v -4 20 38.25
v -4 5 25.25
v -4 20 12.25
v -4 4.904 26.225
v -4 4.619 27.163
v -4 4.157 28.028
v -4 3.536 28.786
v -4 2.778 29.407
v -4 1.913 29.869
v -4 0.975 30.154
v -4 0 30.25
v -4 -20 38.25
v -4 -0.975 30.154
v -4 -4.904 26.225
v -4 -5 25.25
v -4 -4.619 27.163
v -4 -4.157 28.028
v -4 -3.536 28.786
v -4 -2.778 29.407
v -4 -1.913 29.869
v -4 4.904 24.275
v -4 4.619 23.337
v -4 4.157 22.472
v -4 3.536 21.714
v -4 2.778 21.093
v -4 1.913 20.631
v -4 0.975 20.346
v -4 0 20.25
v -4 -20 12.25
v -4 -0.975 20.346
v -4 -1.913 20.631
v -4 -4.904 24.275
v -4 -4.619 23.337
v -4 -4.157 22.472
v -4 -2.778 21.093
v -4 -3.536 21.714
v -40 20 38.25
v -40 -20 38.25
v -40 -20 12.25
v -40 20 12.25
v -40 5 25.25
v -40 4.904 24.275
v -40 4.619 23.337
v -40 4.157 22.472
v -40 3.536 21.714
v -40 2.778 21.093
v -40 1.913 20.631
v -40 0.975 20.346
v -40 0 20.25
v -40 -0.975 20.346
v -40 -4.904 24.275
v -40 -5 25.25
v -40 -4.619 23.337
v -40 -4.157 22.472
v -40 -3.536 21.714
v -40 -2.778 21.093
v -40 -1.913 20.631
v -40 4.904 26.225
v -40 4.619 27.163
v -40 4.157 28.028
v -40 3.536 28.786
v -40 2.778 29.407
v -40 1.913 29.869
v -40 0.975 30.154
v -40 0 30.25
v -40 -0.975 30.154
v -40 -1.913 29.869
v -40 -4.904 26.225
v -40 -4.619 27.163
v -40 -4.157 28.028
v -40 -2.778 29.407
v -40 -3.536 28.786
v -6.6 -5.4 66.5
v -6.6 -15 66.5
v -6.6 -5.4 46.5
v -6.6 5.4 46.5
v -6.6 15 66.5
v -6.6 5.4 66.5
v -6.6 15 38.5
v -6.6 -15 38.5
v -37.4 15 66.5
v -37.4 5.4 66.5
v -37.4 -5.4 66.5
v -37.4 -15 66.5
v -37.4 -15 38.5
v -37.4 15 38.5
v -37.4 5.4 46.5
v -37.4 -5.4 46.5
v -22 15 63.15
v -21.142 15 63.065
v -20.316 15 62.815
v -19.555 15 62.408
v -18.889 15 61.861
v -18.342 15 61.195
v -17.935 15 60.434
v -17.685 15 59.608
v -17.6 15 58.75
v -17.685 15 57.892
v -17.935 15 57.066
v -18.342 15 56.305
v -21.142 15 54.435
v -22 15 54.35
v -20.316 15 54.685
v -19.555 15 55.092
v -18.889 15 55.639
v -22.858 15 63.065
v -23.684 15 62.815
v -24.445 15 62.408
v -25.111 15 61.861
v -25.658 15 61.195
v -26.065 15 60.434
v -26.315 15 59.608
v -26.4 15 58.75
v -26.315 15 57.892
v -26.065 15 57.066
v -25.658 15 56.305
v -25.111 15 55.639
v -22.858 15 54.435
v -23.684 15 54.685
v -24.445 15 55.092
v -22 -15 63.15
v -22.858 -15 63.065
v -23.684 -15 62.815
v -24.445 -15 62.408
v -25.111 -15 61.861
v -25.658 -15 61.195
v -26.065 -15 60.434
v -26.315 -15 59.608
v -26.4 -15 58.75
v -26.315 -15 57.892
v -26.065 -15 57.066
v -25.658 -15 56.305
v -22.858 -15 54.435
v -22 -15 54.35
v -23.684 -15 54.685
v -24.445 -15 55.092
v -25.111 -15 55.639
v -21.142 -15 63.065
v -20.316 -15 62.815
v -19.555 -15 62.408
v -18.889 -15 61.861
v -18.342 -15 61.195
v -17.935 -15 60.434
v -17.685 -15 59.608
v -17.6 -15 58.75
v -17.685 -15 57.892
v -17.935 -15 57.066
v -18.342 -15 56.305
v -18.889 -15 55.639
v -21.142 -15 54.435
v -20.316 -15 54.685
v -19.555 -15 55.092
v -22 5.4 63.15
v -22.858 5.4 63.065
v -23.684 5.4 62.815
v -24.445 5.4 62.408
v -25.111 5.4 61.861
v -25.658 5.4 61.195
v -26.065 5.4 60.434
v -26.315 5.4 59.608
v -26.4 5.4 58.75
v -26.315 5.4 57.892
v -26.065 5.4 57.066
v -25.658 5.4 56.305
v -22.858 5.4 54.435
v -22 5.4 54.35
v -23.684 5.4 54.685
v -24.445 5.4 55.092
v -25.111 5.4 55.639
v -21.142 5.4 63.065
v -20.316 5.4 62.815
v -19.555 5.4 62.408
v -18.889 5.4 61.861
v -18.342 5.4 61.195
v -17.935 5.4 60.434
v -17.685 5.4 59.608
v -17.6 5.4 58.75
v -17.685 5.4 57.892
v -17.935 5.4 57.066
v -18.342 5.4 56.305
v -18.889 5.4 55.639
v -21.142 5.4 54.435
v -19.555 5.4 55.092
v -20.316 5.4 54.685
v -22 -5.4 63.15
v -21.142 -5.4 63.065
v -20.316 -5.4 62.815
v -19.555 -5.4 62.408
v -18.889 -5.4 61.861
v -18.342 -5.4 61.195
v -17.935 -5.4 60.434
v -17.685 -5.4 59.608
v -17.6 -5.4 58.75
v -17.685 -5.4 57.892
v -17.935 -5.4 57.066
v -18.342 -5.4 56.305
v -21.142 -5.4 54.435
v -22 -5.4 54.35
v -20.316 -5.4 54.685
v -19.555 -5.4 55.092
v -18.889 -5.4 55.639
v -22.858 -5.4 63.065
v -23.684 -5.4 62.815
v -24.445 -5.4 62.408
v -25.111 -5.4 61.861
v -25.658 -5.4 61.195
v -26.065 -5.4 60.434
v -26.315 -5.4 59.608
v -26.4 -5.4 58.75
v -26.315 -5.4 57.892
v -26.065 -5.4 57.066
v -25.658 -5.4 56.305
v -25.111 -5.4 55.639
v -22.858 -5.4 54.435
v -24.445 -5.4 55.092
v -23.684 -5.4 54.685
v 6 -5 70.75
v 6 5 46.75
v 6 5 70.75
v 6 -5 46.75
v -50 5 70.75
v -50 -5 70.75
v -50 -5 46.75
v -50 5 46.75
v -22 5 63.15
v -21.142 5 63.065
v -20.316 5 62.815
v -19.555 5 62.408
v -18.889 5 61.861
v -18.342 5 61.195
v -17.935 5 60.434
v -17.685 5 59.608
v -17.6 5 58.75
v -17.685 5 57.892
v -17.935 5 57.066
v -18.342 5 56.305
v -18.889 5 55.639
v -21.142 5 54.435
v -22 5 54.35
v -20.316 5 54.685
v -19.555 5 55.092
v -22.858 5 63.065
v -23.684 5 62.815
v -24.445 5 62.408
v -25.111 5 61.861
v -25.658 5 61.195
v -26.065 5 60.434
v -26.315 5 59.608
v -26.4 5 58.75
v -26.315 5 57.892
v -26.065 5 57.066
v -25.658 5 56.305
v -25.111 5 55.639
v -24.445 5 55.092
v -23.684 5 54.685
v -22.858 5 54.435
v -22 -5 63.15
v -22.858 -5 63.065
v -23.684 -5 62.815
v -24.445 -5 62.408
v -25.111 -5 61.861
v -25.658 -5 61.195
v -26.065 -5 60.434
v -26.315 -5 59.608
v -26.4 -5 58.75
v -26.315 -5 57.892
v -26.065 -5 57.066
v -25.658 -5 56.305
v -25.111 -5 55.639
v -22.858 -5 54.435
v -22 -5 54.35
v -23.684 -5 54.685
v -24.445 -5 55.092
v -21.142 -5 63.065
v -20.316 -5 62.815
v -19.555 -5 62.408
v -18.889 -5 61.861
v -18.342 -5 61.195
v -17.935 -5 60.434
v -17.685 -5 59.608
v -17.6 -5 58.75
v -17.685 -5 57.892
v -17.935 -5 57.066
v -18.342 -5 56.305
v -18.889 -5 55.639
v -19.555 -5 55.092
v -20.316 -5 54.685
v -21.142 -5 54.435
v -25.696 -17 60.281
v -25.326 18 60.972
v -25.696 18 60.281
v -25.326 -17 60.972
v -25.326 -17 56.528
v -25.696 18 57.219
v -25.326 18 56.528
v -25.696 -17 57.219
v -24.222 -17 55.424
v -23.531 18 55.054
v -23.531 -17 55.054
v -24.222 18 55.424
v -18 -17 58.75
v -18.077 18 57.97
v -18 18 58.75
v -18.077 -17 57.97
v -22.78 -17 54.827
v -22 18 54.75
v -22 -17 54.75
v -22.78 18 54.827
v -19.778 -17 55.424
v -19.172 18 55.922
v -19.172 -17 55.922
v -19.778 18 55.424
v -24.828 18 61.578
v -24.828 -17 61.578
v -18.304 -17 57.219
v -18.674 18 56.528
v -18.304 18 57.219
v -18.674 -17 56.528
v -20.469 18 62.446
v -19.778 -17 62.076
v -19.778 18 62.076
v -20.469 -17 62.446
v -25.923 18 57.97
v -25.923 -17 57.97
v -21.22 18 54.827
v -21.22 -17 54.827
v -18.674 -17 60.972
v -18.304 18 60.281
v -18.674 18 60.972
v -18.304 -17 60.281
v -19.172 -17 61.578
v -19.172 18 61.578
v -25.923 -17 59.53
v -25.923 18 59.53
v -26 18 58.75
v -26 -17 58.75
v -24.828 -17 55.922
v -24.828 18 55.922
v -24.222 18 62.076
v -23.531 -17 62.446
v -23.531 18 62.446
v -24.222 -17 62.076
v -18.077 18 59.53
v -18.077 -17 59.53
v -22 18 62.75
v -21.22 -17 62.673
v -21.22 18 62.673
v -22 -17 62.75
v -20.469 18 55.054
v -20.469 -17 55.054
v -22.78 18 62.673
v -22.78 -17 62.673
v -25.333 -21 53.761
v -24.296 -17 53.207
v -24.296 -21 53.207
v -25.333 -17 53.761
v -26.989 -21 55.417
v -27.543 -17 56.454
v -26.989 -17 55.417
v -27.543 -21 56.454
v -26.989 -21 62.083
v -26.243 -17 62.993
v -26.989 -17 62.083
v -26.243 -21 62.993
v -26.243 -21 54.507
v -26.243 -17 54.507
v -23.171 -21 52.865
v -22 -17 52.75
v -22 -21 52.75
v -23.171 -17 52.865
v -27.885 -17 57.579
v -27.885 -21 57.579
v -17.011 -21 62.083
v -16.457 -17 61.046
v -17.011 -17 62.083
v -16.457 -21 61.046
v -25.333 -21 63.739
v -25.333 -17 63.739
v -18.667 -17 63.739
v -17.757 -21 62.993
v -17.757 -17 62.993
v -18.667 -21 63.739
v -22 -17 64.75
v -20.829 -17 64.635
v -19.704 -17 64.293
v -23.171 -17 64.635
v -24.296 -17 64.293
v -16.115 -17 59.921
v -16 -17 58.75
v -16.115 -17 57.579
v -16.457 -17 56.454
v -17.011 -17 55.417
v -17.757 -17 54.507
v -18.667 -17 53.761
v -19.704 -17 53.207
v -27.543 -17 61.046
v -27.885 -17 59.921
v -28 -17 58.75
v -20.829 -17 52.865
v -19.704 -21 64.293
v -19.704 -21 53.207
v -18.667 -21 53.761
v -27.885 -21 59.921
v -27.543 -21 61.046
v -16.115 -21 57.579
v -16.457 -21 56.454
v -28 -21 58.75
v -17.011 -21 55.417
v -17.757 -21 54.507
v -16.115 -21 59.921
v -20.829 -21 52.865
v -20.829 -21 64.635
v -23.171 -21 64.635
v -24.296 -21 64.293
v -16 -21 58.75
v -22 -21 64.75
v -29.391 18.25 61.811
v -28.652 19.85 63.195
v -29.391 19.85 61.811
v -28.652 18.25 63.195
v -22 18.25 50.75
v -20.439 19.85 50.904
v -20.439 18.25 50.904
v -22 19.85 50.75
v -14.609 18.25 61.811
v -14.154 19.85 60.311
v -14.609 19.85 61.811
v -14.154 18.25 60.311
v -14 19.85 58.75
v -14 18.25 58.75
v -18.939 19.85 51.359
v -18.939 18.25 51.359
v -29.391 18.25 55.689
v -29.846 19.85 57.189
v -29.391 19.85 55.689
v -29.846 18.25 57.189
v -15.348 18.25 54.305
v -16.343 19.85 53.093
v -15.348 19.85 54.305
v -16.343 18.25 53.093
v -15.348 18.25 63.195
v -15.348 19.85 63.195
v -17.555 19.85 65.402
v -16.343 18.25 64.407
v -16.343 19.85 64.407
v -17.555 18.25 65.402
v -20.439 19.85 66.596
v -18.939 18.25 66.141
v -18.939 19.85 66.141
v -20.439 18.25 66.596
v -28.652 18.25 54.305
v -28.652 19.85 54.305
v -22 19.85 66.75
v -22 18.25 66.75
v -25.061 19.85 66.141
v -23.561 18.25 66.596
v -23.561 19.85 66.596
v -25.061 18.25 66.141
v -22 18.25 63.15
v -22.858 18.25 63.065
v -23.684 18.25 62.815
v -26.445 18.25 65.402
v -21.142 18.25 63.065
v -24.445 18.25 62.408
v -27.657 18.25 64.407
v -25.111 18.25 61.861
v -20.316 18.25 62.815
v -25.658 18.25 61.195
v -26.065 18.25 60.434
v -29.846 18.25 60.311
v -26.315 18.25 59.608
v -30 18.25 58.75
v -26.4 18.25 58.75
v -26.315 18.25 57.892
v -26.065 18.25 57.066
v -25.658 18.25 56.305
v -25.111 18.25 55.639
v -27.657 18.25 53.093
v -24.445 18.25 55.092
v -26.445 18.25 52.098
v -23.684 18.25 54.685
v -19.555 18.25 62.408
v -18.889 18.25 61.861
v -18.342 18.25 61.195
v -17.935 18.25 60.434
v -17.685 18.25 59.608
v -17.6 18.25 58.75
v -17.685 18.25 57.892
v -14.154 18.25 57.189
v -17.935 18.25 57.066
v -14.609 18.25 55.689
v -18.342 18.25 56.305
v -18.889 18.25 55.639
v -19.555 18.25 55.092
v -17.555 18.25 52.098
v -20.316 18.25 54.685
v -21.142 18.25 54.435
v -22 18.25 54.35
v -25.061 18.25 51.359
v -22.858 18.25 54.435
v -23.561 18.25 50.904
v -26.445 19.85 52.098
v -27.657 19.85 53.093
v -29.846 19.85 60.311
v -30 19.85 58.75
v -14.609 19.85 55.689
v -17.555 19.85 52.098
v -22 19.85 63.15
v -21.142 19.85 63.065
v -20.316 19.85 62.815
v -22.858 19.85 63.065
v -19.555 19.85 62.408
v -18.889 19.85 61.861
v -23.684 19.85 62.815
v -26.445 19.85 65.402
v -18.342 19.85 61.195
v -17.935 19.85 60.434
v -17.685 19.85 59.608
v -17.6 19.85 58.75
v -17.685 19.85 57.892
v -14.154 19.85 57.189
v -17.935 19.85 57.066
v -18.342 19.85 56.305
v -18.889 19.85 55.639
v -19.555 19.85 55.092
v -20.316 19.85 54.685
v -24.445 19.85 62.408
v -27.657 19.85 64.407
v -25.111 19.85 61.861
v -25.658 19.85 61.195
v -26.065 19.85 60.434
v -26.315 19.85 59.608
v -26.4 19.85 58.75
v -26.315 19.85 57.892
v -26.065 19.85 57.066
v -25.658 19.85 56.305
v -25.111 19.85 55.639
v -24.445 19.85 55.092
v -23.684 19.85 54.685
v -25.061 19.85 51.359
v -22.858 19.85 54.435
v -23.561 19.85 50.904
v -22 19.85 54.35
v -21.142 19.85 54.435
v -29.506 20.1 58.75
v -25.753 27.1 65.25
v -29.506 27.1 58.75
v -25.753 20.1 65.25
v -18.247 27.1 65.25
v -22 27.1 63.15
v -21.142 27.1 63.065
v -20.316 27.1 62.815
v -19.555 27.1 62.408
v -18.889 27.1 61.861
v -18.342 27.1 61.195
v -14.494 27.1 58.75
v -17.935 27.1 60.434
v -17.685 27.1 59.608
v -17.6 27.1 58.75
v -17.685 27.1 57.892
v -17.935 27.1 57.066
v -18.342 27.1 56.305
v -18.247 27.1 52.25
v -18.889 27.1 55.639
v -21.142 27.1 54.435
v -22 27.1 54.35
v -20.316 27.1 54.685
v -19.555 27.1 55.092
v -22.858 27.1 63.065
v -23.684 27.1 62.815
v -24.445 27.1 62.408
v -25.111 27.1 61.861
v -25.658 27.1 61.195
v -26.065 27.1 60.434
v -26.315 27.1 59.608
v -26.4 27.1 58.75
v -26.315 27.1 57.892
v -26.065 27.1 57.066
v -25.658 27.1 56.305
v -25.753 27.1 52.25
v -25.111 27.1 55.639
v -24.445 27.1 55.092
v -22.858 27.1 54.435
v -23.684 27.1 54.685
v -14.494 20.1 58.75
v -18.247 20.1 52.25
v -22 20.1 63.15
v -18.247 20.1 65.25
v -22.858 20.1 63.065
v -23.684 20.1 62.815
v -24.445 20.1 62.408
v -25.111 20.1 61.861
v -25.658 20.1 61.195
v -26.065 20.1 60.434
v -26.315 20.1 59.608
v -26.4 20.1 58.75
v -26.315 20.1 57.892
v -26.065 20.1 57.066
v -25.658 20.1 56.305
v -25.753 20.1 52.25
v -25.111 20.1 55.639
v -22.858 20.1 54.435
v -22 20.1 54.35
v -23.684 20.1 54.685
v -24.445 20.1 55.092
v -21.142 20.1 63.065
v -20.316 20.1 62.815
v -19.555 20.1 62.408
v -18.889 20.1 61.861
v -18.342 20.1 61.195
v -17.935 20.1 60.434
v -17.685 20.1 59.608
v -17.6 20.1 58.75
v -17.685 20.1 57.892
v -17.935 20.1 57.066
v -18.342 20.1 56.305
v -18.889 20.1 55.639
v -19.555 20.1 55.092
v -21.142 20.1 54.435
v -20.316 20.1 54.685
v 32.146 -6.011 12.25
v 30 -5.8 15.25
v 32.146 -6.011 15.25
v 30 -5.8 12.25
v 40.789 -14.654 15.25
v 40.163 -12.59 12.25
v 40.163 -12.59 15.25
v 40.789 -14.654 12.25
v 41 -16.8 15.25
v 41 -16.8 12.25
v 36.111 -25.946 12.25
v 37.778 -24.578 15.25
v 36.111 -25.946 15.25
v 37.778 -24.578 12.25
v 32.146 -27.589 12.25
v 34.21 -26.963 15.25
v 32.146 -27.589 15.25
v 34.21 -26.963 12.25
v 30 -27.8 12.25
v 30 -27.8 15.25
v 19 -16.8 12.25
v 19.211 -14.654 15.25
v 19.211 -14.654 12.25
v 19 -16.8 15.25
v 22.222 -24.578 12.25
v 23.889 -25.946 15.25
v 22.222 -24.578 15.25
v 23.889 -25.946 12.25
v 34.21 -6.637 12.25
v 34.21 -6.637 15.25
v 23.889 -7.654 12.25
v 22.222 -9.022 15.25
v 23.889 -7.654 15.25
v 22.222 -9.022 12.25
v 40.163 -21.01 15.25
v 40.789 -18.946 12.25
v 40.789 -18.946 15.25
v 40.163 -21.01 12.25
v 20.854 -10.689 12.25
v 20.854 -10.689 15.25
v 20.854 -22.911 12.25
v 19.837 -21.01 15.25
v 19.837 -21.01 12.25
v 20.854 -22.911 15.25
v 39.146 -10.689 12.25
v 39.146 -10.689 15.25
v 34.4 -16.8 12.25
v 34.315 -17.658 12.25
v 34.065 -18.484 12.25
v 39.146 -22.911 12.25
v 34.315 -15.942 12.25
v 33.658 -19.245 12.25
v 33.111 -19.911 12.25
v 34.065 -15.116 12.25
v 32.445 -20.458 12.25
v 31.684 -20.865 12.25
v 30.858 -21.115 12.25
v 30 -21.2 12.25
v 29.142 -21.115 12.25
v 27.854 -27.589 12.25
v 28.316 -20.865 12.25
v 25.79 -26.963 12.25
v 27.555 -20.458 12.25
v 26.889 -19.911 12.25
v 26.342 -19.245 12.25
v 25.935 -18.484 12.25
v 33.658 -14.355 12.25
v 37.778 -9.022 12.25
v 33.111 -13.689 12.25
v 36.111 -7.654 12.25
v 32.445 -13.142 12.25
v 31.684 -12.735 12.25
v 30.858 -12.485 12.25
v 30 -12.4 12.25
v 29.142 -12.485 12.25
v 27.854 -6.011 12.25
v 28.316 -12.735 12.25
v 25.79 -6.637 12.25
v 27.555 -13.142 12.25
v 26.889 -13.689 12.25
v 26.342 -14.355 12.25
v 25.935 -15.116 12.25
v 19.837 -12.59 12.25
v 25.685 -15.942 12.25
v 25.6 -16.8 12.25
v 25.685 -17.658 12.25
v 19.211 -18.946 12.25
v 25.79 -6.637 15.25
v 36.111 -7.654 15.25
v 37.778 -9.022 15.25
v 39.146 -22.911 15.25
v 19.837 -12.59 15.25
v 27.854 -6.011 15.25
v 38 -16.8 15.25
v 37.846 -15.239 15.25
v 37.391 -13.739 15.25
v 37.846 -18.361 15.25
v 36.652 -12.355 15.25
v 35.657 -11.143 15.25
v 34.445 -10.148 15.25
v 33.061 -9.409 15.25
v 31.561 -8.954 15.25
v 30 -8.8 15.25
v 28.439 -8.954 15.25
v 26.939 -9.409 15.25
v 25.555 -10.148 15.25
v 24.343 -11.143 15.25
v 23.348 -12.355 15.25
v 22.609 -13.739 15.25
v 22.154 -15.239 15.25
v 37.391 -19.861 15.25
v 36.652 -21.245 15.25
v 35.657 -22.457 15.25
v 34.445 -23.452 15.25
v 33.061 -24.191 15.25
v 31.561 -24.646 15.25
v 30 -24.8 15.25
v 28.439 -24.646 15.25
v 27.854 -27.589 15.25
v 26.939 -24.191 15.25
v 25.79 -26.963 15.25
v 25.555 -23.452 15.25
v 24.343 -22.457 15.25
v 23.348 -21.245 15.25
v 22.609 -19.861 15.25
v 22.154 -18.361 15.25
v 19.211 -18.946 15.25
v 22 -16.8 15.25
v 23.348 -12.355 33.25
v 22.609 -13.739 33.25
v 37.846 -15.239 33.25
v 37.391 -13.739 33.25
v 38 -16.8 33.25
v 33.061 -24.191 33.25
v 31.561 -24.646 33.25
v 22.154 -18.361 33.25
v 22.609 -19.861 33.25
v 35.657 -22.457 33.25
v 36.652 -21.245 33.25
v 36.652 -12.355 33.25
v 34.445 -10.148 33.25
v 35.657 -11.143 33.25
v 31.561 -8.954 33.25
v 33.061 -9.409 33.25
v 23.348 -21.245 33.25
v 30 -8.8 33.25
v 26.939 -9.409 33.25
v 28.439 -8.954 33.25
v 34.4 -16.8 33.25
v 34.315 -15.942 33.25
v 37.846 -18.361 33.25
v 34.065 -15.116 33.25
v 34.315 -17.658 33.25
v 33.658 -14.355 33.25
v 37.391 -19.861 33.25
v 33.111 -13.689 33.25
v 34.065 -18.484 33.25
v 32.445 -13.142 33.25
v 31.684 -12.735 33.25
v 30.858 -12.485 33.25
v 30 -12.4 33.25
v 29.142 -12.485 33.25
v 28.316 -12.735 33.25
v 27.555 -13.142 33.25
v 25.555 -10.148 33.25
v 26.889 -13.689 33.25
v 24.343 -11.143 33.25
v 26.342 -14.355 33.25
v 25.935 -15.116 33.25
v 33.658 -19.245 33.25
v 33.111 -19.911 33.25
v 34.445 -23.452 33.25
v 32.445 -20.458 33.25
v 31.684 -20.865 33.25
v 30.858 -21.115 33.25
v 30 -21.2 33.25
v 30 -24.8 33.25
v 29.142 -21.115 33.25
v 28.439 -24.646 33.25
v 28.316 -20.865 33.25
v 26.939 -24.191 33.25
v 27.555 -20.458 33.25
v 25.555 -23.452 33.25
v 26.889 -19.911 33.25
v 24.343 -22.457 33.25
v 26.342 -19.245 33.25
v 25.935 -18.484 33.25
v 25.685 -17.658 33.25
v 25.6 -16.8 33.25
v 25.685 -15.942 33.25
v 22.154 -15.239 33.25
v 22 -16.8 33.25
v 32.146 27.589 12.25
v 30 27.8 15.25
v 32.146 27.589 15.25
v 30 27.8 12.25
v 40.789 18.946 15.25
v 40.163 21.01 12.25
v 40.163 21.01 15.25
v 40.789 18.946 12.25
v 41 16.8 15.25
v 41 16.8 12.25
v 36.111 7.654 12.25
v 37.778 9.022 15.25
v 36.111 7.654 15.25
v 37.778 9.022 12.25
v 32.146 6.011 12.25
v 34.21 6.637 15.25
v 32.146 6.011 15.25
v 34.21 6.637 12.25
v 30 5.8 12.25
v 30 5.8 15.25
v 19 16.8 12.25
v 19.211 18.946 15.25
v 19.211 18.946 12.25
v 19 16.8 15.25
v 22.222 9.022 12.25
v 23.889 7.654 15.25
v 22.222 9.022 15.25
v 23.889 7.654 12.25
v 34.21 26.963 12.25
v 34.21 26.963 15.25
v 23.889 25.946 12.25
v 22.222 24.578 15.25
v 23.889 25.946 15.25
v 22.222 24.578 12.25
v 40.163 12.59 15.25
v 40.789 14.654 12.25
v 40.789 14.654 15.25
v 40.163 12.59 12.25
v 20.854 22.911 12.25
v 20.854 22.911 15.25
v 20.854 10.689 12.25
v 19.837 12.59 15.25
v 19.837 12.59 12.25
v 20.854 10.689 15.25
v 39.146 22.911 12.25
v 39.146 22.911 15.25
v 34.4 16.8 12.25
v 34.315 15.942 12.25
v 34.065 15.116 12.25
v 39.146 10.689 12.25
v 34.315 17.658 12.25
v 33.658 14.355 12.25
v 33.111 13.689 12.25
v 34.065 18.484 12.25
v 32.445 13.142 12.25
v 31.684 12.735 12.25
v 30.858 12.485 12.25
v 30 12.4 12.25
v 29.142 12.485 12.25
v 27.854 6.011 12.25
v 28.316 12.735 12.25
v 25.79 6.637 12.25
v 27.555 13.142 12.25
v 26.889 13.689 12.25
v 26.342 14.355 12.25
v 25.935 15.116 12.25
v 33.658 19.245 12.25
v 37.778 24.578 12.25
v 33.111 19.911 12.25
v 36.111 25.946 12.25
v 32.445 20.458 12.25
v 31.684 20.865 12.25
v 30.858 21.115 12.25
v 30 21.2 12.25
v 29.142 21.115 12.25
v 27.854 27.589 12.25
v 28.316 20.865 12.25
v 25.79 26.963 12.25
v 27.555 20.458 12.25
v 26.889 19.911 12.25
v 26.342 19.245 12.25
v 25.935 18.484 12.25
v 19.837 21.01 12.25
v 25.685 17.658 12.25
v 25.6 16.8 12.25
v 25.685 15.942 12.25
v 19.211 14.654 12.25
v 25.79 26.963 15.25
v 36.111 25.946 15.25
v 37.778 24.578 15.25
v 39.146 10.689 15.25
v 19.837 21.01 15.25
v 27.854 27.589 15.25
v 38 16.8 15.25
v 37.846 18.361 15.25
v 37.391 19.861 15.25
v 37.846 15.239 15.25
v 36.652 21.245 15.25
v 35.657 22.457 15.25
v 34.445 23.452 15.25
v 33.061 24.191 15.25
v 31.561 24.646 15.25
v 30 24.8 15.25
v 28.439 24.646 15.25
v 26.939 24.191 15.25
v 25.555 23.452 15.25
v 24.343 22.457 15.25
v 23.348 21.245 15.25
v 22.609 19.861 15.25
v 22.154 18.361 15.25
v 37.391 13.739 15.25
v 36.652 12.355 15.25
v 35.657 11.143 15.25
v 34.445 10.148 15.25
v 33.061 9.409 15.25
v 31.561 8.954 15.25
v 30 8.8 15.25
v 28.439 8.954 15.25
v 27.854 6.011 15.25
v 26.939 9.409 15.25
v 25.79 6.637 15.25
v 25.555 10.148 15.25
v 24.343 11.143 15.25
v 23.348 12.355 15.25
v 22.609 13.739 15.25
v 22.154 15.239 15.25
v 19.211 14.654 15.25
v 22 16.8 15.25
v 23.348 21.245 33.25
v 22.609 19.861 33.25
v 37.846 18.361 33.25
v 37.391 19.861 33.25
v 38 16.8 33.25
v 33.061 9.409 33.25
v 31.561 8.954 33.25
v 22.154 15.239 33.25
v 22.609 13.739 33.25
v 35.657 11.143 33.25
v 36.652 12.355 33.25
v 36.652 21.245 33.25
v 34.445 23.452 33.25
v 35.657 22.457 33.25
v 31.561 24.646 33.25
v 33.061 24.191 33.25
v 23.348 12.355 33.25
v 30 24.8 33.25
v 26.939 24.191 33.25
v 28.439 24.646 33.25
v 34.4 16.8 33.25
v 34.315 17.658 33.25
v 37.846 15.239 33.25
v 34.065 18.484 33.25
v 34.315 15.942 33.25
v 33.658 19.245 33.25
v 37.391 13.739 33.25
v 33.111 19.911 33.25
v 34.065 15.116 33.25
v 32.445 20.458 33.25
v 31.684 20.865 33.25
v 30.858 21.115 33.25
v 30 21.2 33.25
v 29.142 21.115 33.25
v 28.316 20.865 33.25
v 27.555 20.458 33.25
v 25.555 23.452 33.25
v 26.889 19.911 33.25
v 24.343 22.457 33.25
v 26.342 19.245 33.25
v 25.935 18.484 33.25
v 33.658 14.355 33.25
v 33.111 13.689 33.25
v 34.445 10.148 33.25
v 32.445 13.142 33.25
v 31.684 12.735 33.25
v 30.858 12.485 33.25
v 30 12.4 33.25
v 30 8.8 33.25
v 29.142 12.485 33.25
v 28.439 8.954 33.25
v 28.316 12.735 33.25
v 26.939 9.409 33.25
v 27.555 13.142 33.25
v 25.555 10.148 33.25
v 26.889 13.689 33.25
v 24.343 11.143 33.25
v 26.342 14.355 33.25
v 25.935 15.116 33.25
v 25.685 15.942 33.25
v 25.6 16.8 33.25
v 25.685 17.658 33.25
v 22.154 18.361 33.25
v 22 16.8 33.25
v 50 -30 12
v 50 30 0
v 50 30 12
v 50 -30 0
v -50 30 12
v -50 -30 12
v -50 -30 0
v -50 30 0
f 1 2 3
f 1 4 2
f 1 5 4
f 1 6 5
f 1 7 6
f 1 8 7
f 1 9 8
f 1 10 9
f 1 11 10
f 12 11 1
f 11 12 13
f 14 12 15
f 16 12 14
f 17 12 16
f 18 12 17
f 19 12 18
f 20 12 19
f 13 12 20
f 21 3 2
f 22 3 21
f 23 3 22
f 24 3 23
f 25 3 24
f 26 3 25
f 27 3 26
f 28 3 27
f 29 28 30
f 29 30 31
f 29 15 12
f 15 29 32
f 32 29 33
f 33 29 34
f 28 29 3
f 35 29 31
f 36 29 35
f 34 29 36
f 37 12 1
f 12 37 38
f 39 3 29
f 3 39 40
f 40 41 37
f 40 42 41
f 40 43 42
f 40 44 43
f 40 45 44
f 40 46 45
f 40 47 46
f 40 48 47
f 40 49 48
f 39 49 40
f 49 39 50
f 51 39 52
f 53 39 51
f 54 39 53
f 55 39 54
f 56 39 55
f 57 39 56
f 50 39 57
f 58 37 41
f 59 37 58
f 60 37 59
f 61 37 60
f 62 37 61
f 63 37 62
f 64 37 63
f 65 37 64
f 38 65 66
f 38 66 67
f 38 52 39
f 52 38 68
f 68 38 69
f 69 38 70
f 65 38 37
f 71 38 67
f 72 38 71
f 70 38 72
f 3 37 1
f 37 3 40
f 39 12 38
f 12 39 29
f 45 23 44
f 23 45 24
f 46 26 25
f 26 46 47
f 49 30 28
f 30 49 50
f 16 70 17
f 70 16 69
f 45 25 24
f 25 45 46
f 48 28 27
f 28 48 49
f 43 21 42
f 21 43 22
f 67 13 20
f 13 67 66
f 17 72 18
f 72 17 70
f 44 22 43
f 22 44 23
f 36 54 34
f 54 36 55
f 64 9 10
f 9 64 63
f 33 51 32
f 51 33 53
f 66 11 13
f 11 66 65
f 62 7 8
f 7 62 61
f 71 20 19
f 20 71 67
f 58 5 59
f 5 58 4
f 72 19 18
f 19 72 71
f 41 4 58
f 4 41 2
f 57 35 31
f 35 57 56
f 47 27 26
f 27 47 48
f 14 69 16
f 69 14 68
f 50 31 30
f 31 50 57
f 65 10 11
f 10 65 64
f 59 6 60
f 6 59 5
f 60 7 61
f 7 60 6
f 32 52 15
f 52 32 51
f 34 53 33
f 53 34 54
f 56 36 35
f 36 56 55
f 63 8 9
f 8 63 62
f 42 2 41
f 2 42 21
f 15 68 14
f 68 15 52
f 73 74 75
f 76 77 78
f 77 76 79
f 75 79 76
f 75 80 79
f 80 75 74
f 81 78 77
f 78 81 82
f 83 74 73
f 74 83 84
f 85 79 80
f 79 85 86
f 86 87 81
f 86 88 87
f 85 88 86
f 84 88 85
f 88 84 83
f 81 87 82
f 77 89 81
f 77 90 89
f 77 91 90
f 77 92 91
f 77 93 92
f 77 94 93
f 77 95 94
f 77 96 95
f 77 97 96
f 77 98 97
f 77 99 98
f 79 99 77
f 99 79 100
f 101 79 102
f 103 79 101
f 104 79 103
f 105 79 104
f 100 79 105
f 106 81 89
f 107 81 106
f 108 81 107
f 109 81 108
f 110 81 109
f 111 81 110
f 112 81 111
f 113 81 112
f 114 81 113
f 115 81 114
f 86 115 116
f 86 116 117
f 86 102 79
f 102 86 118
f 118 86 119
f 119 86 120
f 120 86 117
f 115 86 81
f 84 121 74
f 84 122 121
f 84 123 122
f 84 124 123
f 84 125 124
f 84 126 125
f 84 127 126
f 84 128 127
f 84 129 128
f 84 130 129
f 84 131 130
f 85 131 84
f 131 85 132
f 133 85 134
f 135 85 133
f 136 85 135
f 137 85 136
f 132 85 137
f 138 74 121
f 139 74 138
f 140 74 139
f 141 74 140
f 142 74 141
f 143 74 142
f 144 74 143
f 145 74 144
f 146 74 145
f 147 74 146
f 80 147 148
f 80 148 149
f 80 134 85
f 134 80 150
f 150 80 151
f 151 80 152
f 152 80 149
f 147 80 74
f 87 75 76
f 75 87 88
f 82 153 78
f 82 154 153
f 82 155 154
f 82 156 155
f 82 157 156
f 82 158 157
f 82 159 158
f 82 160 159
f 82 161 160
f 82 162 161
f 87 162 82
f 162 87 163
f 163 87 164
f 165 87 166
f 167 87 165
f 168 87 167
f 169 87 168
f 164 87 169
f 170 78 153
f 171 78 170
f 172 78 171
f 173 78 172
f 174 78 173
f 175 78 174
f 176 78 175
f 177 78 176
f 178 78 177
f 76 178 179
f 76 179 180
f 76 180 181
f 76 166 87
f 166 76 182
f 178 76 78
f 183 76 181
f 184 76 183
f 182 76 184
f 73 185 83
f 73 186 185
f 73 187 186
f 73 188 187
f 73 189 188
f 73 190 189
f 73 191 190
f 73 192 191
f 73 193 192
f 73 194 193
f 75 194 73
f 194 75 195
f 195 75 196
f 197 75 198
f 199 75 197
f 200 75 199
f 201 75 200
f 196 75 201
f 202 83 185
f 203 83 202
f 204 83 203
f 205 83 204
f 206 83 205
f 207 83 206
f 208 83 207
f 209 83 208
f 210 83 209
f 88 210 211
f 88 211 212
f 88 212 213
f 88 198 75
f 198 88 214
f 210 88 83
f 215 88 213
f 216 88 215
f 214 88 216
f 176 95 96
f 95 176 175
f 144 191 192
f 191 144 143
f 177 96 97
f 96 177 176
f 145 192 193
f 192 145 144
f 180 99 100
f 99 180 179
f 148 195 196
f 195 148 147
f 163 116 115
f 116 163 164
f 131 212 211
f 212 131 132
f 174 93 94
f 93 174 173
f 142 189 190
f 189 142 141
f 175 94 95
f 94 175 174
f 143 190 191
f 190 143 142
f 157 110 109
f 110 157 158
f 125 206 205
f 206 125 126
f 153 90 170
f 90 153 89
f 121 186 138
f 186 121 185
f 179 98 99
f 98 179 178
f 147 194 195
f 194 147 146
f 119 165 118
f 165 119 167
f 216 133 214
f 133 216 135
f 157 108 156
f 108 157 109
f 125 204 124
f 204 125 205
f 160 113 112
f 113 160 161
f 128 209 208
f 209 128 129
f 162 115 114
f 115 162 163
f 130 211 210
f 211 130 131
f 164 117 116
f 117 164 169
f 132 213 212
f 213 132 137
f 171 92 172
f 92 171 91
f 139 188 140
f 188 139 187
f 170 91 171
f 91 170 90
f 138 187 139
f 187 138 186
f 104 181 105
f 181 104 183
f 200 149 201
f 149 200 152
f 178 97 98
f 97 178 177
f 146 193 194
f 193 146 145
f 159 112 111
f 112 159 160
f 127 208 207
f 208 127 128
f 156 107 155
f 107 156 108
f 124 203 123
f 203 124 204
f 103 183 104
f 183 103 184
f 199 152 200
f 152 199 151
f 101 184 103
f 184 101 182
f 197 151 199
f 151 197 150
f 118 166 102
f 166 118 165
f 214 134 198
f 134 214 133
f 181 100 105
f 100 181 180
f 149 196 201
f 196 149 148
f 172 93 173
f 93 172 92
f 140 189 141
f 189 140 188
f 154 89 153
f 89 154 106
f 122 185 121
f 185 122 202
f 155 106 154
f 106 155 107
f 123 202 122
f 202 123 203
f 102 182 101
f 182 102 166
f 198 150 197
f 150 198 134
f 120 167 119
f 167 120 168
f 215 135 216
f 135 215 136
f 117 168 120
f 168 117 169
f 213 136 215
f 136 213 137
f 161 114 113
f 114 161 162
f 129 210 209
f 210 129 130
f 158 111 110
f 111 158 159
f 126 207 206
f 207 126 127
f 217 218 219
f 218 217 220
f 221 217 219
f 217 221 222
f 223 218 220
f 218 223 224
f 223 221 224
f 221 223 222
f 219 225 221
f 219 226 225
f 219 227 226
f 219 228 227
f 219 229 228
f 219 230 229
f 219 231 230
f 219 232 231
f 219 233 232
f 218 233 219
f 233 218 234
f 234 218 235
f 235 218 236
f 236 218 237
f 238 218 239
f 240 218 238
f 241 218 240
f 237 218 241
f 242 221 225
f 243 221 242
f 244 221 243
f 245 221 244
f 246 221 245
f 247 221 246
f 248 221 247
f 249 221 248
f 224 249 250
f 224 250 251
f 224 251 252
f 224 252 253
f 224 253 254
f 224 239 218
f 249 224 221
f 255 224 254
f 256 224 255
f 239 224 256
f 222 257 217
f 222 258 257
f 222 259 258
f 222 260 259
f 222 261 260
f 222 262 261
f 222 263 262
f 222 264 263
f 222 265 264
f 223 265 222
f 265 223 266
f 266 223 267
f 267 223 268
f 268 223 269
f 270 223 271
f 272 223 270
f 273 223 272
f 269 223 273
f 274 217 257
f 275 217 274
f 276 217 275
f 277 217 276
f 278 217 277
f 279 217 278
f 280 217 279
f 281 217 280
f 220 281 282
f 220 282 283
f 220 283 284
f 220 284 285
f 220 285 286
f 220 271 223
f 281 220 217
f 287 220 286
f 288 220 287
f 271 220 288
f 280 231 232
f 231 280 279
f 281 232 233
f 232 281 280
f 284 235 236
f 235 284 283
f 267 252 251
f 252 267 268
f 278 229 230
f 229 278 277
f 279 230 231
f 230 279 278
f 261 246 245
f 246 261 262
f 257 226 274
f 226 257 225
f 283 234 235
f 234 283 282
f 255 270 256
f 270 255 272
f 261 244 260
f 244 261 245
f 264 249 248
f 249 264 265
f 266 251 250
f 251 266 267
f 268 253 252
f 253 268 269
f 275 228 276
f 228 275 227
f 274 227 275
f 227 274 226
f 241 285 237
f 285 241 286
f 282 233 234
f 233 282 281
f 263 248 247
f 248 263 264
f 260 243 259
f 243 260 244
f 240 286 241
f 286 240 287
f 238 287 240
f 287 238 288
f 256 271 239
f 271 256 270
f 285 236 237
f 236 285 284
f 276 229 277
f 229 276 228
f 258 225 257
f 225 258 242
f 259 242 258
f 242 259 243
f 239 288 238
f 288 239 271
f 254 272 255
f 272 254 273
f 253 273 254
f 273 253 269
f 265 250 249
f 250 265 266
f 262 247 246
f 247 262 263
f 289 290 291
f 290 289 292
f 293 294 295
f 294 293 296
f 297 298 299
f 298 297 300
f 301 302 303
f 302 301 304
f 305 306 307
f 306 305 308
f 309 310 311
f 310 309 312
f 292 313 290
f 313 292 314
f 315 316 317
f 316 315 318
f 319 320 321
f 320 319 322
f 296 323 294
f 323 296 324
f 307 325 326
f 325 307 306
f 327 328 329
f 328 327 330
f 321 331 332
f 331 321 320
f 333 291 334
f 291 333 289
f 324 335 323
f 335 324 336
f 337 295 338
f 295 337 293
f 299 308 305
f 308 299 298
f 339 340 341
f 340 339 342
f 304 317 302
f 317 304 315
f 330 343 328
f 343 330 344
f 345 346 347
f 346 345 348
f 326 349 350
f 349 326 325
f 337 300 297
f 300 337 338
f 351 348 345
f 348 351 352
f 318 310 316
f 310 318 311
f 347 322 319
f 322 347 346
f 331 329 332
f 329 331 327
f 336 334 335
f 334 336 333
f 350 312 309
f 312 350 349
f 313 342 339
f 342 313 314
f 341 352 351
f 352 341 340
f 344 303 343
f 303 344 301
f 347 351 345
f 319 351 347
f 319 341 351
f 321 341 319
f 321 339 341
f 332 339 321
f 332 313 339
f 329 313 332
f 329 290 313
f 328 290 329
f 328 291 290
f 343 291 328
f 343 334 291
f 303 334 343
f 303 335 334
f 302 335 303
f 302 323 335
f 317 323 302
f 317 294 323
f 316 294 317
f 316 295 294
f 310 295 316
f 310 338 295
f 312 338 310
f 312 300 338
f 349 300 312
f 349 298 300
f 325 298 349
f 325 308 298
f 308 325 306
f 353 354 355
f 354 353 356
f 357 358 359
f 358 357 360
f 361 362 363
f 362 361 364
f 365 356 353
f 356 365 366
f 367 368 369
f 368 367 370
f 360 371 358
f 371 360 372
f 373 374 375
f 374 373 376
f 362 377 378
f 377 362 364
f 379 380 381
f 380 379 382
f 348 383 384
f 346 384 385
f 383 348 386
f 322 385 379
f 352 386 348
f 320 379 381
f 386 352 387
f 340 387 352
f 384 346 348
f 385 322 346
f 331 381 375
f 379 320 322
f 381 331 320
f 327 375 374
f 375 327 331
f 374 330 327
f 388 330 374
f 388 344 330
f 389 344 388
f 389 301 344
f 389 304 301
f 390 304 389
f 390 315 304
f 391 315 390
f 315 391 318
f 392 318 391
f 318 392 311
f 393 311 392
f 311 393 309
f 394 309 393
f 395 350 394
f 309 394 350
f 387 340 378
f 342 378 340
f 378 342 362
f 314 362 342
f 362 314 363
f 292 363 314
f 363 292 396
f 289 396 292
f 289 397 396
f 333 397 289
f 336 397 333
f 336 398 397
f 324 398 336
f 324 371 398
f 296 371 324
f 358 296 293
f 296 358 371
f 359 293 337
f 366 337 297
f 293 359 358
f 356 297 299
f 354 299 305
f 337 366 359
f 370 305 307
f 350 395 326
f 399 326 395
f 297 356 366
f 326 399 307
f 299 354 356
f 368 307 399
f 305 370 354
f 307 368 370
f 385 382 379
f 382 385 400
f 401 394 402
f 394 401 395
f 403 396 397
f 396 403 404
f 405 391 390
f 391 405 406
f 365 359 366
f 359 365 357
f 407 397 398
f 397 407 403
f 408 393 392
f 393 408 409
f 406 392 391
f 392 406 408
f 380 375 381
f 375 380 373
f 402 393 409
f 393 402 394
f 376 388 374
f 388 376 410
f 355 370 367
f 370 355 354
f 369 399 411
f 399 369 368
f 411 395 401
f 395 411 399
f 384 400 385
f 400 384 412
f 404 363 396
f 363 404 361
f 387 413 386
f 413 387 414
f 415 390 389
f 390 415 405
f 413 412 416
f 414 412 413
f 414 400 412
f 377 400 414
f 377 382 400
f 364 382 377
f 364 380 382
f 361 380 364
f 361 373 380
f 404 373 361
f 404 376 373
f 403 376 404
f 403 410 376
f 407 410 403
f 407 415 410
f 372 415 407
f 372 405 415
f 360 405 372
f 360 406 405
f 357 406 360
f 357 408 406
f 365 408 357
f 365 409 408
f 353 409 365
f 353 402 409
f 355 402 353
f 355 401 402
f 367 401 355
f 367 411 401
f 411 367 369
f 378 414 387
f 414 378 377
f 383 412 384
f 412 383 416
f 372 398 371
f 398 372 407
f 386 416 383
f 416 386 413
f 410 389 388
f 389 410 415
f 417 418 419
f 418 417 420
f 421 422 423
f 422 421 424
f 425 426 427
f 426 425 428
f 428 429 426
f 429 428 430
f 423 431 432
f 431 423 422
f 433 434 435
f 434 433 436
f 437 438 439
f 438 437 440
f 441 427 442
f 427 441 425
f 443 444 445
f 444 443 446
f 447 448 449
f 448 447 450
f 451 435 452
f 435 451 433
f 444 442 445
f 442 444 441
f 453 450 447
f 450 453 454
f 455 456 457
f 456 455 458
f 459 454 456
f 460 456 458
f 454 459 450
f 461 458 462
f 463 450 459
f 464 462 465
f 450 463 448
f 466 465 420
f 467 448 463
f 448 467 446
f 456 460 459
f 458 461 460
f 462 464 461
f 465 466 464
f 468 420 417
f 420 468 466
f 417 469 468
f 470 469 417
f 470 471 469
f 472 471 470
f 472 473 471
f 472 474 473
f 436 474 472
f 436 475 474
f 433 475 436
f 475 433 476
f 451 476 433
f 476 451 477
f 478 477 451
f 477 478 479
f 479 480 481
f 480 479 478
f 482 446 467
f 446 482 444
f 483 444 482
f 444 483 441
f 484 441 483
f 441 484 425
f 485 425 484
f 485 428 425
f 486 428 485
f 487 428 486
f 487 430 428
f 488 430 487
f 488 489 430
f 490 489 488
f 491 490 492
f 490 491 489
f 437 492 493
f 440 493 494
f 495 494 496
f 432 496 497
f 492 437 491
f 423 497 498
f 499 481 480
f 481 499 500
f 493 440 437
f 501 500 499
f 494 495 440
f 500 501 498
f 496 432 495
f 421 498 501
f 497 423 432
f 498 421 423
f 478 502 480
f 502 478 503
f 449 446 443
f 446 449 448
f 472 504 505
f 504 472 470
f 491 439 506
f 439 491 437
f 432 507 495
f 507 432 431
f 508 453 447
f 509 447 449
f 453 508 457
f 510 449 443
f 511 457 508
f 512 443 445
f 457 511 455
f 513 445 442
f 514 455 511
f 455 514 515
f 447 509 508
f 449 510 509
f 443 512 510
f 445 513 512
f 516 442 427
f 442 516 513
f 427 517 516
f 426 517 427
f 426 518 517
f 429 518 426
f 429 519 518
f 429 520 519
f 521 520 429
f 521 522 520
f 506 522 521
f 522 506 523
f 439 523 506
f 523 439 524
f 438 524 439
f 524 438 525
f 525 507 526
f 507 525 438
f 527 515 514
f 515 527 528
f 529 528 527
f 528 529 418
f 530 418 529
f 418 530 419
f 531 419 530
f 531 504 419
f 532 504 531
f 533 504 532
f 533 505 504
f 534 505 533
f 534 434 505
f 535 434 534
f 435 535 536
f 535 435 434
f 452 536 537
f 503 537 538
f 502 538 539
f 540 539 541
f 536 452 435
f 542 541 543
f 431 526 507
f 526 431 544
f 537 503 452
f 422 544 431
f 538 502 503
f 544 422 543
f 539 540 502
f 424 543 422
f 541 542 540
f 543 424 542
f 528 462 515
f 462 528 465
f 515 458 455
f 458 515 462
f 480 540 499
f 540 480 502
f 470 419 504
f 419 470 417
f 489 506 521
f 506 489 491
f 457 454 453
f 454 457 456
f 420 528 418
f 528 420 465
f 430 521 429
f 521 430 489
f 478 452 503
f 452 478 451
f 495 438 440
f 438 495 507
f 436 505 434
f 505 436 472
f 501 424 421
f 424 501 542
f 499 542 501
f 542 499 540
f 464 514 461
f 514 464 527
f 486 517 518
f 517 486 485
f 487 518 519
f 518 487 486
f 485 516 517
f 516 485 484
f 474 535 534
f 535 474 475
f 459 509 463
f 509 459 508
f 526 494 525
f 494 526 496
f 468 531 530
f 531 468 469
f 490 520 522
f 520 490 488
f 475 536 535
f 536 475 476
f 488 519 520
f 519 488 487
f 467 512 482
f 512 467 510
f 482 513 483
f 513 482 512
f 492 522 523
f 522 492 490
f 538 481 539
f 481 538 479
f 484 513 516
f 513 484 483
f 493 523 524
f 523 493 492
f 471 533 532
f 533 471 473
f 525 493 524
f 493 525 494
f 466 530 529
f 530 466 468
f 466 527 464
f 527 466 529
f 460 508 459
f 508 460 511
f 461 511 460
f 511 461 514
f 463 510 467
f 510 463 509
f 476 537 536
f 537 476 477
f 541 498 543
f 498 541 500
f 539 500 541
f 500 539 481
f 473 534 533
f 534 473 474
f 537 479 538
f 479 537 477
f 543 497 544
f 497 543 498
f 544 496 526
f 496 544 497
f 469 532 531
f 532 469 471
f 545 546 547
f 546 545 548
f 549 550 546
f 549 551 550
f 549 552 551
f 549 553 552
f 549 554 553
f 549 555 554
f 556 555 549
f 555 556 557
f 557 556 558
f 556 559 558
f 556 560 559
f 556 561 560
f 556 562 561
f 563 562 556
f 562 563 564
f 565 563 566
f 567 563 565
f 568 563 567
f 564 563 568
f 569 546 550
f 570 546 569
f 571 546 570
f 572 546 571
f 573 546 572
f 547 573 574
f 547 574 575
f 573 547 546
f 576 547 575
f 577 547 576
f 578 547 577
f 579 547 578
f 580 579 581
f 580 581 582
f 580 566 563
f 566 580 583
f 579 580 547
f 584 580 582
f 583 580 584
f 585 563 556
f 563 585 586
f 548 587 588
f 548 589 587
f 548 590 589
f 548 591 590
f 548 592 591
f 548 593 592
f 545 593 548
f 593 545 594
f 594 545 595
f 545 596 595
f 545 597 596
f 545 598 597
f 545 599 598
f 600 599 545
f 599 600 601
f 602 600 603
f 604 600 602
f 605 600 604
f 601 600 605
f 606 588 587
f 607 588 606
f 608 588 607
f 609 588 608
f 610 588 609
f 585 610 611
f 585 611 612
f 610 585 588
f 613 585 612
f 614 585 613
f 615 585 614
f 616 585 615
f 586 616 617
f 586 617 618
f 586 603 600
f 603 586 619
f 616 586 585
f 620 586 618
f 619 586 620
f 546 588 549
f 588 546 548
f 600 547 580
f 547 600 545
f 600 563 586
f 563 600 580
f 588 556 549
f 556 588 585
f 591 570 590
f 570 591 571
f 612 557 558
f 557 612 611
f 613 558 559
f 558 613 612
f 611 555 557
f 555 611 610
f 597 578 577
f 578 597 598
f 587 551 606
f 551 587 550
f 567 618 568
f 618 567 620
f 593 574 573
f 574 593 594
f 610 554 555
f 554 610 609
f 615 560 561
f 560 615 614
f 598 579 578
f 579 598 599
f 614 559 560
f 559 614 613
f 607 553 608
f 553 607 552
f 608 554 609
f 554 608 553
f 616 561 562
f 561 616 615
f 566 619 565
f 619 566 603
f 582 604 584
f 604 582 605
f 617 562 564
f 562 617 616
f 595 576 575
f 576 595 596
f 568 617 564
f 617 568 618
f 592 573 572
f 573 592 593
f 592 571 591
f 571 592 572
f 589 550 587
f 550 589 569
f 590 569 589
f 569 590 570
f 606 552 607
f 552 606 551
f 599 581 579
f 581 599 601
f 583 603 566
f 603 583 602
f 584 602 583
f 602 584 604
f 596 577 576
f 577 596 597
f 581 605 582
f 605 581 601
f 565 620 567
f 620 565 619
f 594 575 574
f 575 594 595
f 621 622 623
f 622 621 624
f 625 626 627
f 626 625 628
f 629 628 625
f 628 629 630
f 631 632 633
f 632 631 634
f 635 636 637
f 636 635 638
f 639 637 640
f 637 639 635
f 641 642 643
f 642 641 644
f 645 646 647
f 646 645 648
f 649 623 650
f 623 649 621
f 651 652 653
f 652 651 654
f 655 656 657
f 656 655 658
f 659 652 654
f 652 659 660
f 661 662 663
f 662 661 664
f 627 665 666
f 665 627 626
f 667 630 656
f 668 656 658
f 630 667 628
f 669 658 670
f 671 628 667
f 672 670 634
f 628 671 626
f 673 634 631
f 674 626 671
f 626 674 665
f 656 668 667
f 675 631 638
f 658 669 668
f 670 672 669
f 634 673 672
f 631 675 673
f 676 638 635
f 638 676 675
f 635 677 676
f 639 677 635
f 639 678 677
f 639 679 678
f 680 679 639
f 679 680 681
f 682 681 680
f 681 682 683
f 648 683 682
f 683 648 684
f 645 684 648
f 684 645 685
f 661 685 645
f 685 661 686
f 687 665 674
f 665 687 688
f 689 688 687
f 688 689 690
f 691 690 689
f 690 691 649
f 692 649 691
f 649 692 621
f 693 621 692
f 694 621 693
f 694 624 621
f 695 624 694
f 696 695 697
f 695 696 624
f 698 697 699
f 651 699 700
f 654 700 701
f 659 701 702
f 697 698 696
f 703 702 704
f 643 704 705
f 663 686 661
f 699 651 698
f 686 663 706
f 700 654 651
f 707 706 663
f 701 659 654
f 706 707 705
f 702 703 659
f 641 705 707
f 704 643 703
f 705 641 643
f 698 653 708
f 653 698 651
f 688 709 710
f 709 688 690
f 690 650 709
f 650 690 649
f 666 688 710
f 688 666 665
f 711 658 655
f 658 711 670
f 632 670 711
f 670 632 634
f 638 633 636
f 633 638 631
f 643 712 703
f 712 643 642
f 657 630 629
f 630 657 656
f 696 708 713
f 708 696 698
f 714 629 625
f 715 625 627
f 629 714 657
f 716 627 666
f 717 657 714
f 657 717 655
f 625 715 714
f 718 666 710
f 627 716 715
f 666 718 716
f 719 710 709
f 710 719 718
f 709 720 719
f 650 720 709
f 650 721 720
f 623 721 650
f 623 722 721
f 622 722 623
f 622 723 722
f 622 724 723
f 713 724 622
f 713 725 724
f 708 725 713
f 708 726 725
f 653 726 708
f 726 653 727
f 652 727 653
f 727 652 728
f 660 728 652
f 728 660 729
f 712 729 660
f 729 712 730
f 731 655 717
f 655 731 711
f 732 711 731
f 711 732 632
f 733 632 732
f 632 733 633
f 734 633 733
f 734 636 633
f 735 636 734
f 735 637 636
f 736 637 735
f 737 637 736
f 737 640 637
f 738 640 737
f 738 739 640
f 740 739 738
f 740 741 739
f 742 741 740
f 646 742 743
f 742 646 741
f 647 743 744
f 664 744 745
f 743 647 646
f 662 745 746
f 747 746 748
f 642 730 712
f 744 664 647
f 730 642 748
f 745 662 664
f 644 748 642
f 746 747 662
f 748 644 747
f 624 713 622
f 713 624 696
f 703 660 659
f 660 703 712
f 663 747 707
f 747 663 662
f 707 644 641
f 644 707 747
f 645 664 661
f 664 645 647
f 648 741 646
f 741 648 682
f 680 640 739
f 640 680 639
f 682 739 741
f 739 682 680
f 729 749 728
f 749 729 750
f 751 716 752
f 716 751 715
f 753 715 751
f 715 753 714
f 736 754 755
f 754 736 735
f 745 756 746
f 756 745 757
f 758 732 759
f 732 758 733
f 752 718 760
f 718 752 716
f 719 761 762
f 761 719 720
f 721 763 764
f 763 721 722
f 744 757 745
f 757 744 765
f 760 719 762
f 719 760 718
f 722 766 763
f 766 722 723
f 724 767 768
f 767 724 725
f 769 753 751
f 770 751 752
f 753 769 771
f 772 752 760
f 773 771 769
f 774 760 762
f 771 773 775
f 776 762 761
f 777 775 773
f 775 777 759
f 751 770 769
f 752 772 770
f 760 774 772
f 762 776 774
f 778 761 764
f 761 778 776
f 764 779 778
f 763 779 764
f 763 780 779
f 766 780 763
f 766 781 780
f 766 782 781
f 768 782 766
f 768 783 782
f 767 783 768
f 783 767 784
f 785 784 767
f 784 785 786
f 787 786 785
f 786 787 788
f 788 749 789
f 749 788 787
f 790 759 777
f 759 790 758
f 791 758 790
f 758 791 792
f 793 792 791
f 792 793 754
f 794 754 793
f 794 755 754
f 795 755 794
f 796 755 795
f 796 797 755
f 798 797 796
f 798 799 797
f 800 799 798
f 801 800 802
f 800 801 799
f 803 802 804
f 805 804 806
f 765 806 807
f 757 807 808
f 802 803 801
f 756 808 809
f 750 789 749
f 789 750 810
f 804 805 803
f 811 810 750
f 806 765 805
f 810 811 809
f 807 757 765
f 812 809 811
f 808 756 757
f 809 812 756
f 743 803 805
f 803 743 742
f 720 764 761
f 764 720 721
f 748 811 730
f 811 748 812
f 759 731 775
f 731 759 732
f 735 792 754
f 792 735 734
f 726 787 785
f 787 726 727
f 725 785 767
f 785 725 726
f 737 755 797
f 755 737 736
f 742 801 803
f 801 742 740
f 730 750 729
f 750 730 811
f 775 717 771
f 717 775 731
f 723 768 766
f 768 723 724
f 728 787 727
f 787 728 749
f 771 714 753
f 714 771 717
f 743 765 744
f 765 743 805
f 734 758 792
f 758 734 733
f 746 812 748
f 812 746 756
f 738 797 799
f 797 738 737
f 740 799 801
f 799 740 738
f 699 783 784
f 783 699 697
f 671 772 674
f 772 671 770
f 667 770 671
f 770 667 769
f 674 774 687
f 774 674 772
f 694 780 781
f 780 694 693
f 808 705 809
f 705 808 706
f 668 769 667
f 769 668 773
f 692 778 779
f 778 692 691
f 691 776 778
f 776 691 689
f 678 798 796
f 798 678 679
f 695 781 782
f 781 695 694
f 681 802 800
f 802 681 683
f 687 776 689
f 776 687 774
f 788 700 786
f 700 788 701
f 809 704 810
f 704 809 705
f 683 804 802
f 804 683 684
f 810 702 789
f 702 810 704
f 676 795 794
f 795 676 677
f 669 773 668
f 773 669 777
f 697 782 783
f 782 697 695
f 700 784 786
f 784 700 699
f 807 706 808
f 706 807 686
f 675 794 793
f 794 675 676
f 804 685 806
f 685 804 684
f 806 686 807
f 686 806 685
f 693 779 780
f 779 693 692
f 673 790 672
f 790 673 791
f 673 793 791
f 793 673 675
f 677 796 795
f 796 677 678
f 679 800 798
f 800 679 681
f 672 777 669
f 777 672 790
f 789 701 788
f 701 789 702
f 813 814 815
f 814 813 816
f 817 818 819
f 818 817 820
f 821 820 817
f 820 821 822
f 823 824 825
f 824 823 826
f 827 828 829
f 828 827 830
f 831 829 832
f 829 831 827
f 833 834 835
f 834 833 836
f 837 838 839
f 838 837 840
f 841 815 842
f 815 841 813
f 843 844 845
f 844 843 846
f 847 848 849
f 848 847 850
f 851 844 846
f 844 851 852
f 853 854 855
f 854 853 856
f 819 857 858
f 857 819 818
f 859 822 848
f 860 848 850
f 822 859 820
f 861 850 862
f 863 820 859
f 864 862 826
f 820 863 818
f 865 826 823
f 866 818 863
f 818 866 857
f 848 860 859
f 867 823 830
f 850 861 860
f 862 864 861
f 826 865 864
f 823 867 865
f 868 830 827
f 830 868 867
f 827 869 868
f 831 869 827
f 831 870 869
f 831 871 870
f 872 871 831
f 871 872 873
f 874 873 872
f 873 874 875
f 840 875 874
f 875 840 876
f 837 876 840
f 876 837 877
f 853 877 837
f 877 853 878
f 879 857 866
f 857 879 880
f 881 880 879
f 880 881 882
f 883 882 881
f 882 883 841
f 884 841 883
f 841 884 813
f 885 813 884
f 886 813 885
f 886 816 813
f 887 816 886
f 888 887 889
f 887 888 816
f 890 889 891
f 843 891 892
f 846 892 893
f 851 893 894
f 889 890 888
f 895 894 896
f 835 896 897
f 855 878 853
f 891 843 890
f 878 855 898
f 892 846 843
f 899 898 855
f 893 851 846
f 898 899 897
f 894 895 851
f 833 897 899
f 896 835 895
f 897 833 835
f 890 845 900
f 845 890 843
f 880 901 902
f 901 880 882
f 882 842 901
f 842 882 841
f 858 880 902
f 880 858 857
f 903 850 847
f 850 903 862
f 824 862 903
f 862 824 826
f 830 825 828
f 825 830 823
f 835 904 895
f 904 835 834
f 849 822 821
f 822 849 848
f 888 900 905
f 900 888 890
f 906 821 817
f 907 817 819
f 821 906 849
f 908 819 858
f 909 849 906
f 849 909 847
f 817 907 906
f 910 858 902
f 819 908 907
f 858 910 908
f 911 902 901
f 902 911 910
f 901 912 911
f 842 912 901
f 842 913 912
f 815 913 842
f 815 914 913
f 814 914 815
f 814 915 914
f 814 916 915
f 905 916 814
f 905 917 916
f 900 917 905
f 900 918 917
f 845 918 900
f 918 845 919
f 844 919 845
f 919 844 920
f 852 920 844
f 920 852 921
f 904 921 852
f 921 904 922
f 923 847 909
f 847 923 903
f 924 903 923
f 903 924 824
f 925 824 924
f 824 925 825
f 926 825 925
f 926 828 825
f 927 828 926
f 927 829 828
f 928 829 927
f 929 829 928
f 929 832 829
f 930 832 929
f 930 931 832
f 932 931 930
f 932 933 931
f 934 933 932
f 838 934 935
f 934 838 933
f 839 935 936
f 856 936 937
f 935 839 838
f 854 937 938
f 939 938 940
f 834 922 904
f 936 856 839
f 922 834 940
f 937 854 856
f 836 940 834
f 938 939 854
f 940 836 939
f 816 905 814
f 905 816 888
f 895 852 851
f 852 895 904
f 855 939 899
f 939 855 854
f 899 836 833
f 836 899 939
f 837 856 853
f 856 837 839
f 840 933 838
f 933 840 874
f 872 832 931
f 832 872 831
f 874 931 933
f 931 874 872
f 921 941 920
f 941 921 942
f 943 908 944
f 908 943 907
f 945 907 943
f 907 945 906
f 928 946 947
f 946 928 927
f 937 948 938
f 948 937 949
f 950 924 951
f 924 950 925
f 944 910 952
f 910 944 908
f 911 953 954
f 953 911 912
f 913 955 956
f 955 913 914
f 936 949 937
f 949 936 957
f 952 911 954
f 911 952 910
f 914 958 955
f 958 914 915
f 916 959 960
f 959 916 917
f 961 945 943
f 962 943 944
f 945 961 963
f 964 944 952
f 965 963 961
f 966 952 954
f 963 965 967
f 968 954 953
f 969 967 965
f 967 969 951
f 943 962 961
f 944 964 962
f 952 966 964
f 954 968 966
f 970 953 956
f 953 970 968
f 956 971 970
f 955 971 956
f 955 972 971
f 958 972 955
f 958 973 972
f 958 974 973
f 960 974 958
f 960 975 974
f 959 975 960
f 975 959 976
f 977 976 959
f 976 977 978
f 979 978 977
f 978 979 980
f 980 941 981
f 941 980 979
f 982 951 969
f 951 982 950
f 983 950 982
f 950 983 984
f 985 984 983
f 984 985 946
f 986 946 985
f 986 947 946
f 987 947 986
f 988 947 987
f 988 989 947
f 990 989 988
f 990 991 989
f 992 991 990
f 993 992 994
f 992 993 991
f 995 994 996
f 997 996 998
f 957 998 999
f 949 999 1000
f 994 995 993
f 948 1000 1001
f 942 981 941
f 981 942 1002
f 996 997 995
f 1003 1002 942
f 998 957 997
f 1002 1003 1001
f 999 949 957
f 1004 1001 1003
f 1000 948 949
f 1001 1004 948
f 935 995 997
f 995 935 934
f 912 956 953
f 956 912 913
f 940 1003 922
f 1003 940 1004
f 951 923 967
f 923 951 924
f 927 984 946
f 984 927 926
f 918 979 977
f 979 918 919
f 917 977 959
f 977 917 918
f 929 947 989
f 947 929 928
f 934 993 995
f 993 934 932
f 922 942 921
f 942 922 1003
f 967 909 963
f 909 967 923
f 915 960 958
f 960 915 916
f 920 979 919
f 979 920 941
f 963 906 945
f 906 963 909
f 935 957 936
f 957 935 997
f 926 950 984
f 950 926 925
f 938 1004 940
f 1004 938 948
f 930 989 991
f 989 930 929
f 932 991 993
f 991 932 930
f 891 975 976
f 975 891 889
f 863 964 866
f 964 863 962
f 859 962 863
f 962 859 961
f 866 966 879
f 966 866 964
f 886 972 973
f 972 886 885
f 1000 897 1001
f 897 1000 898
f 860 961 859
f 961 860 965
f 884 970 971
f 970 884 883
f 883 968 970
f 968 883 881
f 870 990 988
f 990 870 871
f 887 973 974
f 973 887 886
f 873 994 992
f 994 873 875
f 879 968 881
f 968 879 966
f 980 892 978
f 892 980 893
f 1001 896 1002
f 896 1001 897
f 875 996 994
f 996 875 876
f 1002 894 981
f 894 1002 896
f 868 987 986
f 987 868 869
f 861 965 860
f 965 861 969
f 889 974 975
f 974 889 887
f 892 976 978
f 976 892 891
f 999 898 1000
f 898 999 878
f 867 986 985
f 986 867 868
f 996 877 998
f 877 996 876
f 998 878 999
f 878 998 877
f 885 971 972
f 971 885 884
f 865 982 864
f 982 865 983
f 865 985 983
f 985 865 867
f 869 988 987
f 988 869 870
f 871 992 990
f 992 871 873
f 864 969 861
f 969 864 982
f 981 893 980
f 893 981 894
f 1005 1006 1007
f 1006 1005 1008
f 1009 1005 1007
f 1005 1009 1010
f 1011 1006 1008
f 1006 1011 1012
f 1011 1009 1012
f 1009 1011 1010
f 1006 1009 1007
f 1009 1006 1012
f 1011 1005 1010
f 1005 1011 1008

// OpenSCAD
$fn = 32;

// ------------------------------------------------------------------------
// Indexing jig: plate 100 x 60 mm, pin d8
// Every part is its own module, assembly() places every instance.
// ------------------------------------------------------------------------

// --- part 1 ---
module jig_plate() {
  difference() {
    translate([-50, -30, 0]) cube([100, 60, 12]);
  }
}

// --- part 2 ---
module locator_block() {
  difference() {
    translate([-18, -20, 0]) cube([36, 40, 26]);
    translate([0, 0, 13]) rotate([0, 90, 0]) cylinder(h = 38, d = 10, center = true);
  }
}

// --- part 3 ---
module index_fork() {
  difference() {
    translate([-15.4, -15, 0]) cube([30.8, 30, 28]);
    translate([-16.4, -5.4, 8]) cube([32.8, 10.8, 21]);
    translate([0, 0, 20.25]) rotate([90, 0, 0]) cylinder(h = 32, d = 8.8, center = true);
  }
}

// --- part 4 ---
module index_arm() {
  difference() {
    translate([-28, -5, 0]) cube([56, 10, 24]);
    translate([0, 0, 12]) rotate([90, 0, 0]) cylinder(h = 12, d = 8.8, center = true);
  }
}

// --- part 5 ---
module index_pin() {
  rotate([0, 90, 0]) cylinder(h = 36, d = 8, center = true);
  translate([-21, 0, 0]) rotate([0, 90, 0]) cylinder(h = 4, d = 12);
}

// --- part 6 ---
module pin_washer() {
  difference() {
      translate([0, 0, 0]) cylinder(h = 1.6, d = 16);
      translate([0, 0, -1]) cylinder(h = 3.6, d = 8.8);
    }
}

// --- part 7 ---
module lock_nut() {
  difference() {
    linear_extrude(height = 7) polygon(points = [[7.506, 0], [3.753, 6.5], [-3.753, 6.5], [-7.506, 0], [-3.753, -6.5], [3.753, -6.5]]);
    translate([0, 0, -1]) cylinder(h = 9, d = 8.8);
  }
}

// --- part 8 ---
module guide_bush_a() {
  difference() {
    union() {
      cylinder(h = 3, d = 22);
      translate([0, 0, 3]) cylinder(h = 18, d = 16);
    }
    translate([0, 0, -1]) cylinder(h = 23, d = 8.8);
  }
}

// --- part 9 ---
module guide_bush_b() {
  difference() {
    union() {
      cylinder(h = 3, d = 22);
      translate([0, 0, 3]) cylinder(h = 18, d = 16);
    }
    translate([0, 0, -1]) cylinder(h = 23, d = 8.8);
  }
}

// --- assembly ---
module assembly() {
  color([0.80, 0.24, 0.20]) translate([0, 0, 0]) rotate([0, 0, 0]) jig_plate();
  color([0.20, 0.45, 0.75]) translate([-22, 0, 12.25]) rotate([0, 0, 0]) locator_block();
  color([0.25, 0.62, 0.32]) translate([-22, 0, 38.5]) rotate([0, 0, 0]) index_fork();
  color([0.92, 0.70, 0.18]) translate([-22, 0, 46.75]) rotate([0, 0, 0]) index_arm();
  color([0.58, 0.35, 0.70]) translate([-22, 0, 58.75]) rotate([0, 0, 90]) index_pin();
  color([0.16, 0.66, 0.66]) translate([-22, 19.85, 58.75]) rotate([90, 0, 0]) pin_washer();
  color([0.85, 0.48, 0.18]) translate([-22, 27.1, 58.75]) rotate([90, 0, 0]) lock_nut();
  color([0.55, 0.60, 0.65]) translate([30, -16.8, 12.25]) rotate([0, 0, 0]) guide_bush_a();
  color([0.75, 0.30, 0.55]) translate([30, 16.8, 12.25]) rotate([0, 0, 0]) guide_bush_b();
}

assembly();
